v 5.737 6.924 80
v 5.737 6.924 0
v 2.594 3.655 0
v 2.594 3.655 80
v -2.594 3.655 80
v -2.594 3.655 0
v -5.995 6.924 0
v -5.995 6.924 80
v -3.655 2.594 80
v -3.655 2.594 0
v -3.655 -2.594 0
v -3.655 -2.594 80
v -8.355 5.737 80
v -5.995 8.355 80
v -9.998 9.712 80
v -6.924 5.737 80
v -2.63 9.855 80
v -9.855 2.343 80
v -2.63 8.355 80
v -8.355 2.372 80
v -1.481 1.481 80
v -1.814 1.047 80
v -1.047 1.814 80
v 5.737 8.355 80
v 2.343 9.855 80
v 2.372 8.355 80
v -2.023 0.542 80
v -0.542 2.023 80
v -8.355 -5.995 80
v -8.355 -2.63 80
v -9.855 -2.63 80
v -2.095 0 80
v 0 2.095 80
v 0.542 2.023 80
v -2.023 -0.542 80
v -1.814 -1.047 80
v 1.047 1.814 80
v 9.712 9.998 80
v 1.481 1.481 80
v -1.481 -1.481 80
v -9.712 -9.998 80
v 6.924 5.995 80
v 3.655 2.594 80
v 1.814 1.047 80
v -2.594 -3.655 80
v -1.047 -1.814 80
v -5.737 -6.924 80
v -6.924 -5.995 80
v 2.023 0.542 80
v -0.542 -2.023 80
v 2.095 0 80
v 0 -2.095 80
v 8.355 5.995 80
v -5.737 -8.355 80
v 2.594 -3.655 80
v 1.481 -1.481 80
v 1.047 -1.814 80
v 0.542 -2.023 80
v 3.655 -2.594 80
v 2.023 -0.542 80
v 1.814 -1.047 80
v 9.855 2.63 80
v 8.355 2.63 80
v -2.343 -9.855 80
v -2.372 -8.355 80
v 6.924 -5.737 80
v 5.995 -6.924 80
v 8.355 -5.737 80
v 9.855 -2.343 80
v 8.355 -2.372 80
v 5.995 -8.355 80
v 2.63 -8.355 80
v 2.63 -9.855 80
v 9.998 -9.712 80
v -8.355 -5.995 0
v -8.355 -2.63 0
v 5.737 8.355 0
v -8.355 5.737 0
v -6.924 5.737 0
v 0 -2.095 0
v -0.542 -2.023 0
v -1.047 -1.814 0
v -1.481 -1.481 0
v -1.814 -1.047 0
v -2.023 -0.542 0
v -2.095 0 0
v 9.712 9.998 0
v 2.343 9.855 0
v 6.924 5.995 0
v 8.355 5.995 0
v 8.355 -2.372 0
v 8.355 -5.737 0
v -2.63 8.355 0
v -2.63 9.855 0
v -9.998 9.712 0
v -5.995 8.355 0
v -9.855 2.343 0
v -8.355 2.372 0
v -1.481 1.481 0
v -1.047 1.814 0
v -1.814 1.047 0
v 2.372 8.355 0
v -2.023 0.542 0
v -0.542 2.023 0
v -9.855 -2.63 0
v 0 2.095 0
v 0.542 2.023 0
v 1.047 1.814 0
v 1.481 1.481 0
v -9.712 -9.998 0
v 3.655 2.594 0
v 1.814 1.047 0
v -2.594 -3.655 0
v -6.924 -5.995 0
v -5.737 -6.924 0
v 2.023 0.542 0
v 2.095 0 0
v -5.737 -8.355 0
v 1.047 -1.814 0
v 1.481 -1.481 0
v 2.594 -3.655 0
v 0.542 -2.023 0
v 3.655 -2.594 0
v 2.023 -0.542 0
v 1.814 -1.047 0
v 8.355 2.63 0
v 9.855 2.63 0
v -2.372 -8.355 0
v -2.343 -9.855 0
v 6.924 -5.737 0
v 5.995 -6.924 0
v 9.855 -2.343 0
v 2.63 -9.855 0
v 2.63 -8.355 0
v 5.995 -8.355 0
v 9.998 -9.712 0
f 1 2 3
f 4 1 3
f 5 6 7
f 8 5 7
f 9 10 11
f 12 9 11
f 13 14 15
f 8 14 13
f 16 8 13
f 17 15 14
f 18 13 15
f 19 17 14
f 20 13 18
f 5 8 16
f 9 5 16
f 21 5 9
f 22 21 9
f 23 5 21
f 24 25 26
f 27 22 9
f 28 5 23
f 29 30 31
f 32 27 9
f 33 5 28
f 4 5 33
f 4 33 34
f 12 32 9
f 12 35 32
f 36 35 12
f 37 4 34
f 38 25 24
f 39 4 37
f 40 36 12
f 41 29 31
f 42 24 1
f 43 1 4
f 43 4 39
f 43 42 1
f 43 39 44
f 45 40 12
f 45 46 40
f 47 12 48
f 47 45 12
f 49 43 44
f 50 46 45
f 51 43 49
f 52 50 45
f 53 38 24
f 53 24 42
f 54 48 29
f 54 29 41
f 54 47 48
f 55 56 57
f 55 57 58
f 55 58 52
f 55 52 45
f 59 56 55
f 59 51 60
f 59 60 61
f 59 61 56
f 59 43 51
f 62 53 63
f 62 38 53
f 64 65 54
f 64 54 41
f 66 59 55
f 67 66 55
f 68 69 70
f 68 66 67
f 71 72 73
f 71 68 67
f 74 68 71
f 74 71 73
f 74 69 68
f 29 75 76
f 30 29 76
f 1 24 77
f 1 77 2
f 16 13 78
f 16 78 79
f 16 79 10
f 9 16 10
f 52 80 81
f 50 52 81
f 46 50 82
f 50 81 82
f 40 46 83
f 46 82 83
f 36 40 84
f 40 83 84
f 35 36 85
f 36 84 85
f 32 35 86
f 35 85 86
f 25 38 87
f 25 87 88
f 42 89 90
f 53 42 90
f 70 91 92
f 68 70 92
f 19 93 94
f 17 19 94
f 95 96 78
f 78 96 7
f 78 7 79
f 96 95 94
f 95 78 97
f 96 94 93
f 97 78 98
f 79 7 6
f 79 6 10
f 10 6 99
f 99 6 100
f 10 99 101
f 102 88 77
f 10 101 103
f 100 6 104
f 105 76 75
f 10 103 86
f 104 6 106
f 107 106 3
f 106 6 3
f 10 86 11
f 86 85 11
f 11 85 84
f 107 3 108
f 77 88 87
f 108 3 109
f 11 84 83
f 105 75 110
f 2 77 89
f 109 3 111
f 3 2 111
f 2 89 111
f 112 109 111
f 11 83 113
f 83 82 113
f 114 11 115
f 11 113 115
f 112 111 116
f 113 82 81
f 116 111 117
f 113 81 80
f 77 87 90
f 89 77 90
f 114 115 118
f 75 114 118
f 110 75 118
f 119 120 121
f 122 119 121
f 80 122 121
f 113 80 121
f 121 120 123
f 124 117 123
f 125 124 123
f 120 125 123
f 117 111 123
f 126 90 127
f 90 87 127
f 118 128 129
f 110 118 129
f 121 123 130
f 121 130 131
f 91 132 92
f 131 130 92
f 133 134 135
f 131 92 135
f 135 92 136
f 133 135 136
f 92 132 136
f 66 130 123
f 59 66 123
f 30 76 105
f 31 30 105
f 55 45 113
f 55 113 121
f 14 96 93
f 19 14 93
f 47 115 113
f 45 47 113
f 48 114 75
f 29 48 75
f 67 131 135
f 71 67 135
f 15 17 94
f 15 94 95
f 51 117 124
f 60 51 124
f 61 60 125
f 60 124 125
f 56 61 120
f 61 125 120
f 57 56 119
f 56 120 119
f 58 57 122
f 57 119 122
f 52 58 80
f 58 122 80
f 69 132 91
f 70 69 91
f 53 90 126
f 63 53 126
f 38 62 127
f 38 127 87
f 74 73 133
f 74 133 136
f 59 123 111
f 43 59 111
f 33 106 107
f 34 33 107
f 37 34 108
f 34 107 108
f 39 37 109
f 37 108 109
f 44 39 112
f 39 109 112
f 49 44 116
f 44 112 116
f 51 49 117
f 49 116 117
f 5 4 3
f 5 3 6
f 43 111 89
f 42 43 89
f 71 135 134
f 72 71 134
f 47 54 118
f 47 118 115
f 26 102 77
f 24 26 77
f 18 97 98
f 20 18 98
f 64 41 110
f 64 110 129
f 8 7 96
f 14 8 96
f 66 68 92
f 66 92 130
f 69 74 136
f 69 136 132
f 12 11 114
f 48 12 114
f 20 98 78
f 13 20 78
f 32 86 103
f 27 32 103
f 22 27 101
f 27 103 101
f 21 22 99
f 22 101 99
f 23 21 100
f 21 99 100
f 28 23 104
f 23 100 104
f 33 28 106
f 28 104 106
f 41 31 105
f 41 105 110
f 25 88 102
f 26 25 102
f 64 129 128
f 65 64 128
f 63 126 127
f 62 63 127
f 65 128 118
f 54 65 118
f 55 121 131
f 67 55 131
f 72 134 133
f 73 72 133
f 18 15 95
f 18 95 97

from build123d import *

# Parameters (mm, degrees)
F1_DEPTH = 80
F3_COUNT = 4


with BuildPart() as f1:
    # F0 (on Top) → F1 (new body)
    with BuildSketch(Plane.XY):
        with BuildLine():
            Line((0, 3.655), (-2.594135, 3.655))
            Line((-2.594135, 3.655), (-5.994502, 6.92418))
            Line((-5.994502, 6.92418), (-5.994502, 8.355))
            Line((-5.994502, 8.355), (-2.629502, 8.355))
            Line((-2.629502, 8.355), (-2.629502, 9.855))
            Line((-2.629502, 9.855), (-9.998107, 9.711609))
            Line((-9.998107, 9.711609), (-9.854716, 2.343004))
            Line((-9.854716, 2.343004), (-8.355, 2.372188))
            Line((-8.355, 2.372188), (-8.355, 5.737188))
            Line((-8.355, 5.737188), (-6.92418, 5.737188))
            Line((-6.92418, 5.737188), (-3.655, 2.594135))
            Line((-3.655, 2.594135), (-3.655, 0))
            Line((-3.655, 0), (-2.094884, 0))
            ThreePointArc((-2.094884, 0), (-1.481273, 1.481273), (0, 2.094884))
            Line((0, 2.094884), (0, 3.655))
        make_face()
    extrude(amount=F1_DEPTH)

    # F3: F1 ×4 about axis
    f3_axis = Axis((0, 0, 0.688764), (0, 0, 1))


with BuildPart() as f1_1:
    add(f1.part)
    for i in range(1, F3_COUNT):
        add(f1.part.rotate(f3_axis, i * 360 / F3_COUNT))


solid = f1_1.part
